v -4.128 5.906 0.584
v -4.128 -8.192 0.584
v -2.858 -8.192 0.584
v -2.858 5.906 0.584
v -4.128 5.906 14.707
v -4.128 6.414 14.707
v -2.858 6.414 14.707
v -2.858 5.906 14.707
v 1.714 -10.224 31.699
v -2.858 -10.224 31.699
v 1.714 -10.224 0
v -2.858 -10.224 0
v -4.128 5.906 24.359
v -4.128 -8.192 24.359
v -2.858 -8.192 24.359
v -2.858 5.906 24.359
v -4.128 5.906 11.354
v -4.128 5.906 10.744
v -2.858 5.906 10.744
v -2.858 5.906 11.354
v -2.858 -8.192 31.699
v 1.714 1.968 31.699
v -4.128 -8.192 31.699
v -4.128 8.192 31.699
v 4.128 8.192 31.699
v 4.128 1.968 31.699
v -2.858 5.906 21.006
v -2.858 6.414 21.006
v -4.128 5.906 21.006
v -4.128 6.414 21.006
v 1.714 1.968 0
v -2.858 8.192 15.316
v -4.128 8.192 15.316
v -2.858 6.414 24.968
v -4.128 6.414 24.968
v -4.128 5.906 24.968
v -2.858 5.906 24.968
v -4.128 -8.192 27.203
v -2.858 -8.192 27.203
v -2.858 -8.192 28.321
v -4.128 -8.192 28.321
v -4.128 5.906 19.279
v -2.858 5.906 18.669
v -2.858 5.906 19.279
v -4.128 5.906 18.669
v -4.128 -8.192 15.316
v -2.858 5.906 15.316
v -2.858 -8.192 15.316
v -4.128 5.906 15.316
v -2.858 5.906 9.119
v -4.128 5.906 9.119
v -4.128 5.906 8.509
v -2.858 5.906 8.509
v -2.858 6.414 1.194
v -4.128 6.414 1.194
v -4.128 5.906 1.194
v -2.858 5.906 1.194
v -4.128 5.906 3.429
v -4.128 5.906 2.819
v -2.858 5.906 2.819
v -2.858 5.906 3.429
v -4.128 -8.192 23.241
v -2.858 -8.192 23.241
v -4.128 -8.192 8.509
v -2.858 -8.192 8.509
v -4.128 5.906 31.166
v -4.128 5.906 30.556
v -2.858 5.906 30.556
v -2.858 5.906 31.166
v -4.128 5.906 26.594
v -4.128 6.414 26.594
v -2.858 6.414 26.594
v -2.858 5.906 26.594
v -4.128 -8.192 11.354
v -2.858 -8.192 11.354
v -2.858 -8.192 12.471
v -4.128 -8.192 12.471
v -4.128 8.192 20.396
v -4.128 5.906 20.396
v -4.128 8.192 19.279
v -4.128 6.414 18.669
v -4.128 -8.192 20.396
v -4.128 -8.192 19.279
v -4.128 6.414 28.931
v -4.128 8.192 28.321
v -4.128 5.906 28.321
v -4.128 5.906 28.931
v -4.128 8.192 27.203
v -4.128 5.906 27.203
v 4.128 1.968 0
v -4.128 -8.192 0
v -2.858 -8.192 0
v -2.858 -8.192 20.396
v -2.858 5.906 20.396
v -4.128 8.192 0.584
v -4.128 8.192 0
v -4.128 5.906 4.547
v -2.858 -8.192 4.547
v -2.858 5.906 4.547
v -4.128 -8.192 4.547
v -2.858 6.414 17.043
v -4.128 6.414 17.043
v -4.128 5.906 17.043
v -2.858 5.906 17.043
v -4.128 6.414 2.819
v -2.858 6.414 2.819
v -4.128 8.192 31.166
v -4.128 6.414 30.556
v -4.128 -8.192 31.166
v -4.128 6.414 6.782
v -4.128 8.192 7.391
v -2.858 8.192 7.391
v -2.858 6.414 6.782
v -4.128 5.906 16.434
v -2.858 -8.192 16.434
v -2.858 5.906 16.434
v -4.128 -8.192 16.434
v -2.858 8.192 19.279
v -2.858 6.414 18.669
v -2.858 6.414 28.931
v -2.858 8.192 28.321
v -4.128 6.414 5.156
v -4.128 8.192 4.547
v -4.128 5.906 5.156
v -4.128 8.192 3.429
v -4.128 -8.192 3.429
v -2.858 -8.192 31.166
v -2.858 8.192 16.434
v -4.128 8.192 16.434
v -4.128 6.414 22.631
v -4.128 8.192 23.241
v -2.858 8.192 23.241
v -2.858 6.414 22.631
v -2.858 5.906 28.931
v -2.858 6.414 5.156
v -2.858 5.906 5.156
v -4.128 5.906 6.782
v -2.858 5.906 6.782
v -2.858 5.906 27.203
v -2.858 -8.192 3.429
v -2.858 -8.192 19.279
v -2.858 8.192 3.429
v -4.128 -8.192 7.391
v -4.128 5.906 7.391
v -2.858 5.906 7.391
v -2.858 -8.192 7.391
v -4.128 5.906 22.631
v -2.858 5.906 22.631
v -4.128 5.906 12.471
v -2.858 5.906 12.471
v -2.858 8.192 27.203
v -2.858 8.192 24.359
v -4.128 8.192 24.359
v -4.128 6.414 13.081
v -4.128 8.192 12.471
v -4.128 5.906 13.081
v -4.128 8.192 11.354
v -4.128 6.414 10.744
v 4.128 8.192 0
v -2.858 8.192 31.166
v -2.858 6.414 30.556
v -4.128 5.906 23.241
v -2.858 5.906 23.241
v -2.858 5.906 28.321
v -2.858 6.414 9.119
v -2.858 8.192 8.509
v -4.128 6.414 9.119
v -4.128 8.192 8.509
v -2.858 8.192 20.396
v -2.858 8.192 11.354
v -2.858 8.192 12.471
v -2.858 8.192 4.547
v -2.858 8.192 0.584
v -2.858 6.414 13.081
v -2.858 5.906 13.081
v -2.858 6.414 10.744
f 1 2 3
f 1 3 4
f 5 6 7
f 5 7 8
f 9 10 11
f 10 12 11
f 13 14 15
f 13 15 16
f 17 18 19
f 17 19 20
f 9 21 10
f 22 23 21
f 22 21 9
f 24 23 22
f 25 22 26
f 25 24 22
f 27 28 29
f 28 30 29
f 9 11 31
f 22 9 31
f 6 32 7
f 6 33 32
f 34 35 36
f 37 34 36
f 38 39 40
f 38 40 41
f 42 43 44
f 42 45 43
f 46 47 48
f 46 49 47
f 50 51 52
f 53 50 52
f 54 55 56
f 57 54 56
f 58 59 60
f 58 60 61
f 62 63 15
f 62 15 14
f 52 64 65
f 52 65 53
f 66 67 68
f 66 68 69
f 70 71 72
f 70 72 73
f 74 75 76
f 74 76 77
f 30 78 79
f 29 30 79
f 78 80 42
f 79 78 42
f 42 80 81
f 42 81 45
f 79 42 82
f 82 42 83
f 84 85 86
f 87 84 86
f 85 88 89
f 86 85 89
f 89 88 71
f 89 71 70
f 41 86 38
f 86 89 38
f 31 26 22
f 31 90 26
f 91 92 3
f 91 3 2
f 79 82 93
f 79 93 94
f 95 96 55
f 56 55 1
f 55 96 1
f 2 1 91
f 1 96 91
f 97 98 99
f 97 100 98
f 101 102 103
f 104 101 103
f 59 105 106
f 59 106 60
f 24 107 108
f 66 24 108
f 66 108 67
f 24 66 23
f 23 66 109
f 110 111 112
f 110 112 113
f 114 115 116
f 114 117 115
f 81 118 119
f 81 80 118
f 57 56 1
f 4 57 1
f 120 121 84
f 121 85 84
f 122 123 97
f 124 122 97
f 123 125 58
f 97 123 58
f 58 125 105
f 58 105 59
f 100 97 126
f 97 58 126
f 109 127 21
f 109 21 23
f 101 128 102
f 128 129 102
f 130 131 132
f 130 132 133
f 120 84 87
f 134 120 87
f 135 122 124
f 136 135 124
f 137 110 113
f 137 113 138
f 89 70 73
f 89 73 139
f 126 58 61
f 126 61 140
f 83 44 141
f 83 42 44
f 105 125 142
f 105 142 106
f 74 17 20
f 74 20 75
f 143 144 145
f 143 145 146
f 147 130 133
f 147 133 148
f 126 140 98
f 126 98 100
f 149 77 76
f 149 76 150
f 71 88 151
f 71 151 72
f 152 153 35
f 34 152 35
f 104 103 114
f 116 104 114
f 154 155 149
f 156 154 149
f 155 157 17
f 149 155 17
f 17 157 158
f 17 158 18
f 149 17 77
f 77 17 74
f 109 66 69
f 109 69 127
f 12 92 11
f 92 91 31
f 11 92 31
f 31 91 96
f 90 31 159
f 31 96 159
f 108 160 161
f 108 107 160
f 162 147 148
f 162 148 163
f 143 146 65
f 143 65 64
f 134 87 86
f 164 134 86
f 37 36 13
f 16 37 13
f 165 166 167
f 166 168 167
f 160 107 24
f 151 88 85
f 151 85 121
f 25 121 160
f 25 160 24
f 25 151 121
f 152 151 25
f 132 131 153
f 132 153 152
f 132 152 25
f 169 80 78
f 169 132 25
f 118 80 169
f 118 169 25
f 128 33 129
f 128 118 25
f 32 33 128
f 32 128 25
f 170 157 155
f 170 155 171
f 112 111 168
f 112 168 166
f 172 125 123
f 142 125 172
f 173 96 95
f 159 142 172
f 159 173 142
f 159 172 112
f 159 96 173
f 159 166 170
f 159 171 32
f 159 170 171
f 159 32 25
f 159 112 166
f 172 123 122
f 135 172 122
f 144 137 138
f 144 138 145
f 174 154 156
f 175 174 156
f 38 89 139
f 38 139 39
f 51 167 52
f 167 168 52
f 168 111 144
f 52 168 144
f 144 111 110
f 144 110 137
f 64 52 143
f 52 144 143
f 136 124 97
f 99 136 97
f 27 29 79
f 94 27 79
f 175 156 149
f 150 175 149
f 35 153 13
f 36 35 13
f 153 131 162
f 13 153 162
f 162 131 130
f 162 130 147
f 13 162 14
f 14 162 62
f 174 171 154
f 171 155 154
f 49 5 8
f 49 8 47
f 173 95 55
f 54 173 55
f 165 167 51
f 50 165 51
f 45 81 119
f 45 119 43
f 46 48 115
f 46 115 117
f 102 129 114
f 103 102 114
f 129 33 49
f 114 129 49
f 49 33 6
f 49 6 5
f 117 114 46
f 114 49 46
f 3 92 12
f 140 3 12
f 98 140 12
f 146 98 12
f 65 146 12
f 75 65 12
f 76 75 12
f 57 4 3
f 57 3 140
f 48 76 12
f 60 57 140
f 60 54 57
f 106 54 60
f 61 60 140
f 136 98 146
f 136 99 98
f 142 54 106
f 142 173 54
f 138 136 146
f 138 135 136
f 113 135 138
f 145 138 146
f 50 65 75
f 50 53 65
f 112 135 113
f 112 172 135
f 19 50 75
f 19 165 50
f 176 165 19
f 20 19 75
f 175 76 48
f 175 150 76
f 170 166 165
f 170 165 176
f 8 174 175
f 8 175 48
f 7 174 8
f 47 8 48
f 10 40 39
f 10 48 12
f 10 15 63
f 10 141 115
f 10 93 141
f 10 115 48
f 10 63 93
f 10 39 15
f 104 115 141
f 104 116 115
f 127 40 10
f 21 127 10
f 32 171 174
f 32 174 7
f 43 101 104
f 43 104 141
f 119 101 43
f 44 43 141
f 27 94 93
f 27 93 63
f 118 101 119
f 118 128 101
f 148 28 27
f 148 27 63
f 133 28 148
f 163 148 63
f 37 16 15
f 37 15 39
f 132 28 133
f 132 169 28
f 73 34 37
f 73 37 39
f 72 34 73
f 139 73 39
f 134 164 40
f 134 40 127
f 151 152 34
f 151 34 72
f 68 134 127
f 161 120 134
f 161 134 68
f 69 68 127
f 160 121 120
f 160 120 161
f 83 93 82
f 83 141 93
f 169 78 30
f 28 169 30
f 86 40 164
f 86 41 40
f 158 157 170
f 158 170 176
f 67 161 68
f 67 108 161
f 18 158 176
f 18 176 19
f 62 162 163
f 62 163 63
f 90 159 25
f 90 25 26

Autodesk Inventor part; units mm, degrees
ref_plane "YZ Plane" through (0, 0, 0) normal (1, 0, 0) x (0, 1, 0)
ref_plane "XZ Plane" through (0, 0, 0) normal (0, 1, 0) x (-1, 0, 0)
ref_plane "XY Plane" through (0, 0, 0) normal (0, 0, 1) x (1, 0, 0)
sketch "Sketch1" plane through (0, 0, 0) normal (0, 0, 1) x (1, 0, 0)
  line L0 (-4.1275, 8.1915) -> (4.1275, 8.1915)
  line L1 (-4.1275, 8.1915) -> (-4.1275, -8.1915)
  line L2 (-2.8575, -10.2235) -> (1.7145, -10.2235)
  line L3 (-2.8575, -10.2235) -> (-2.8575, -8.1915)
  line L4 (-2.8575, -8.1915) -> (-4.1275, -8.1915)
  line L5 (4.1275, 8.1915) -> (4.1275, 1.9685)
  line L6 (1.7145, -10.2235) -> (1.7145, 1.9685)
  line L7 (4.1275, 1.9685) -> (1.7145, 1.9685)
  point P0 (0, 0)
  point P1 (0, 8.1915)
  point P2 (-4.1275, 0)
  dimension "d0" = 8.255
  dimension "d2" = 1.27
  dimension "d3" = 2.032
  dimension "d4" = 18.415
  dimension "d5" = 4.572
  dimension "d6" = 6.223
extrude "Extrusion1" add sketch "Sketch1" along normal blind 31.6992
sketch "Sketch2" plane through (-4.1275, -8.1915, 31.6992) normal (-1, 0, 0) x (0, 0, 1)
  line L0 (-31.6992, 16.383) -> (0, 16.383) projected
  line L1 (-31.6992, 0) -> (-31.6992, 16.383) projected
  line L2 (-31.6992, 0) -> (0, 0) projected
  line L3 (-31.115, 16.383) -> (-28.2702, 16.383)
  line L4 (-28.2702, 14.097) -> (-28.2702, 0)
  line L5 (-28.2702, 0) -> (-31.115, 0)
  line L6 (-31.115, 0) -> (-31.115, 14.097)
  line L7 (-30.5054, 14.605) -> (-30.5054, 14.097)
  line L8 (-31.115, 16.383) -> (-30.5054, 14.605)
  line L9 (-30.5054, 14.097) -> (-31.115, 14.097)
  line L10 (-28.8798, 14.605) -> (-28.8798, 14.097)
  line L11 (-28.2702, 16.383) -> (-28.8798, 14.605)
  line L12 (-28.8798, 14.097) -> (-28.2702, 14.097)
  line L13 (-27.1526, 16.383) -> (-24.3078, 16.383)
  line L14 (-24.3078, 14.097) -> (-24.3078, 0)
  line L15 (-24.3078, 0) -> (-27.1526, 0)
  line L16 (-27.1526, 0) -> (-27.1526, 14.097)
  line L17 (-26.543, 14.605) -> (-26.543, 14.097)
  line L18 (-27.1526, 16.383) -> (-26.543, 14.605)
  line L19 (-26.543, 14.097) -> (-27.1526, 14.097)
  line L20 (-24.3078, 16.383) -> (-24.9174, 14.605)
  line L21 (-24.9174, 14.605) -> (-24.9174, 14.097)
  line L22 (-24.9174, 14.097) -> (-24.3078, 14.097)
  line L23 (-23.1902, 16.383) -> (-20.3454, 16.383)
  line L24 (-20.3454, 14.097) -> (-20.3454, 0)
  line L25 (-20.3454, 0) -> (-23.1902, 0)
  line L26 (-23.1902, 0) -> (-23.1902, 14.097)
  line L27 (-22.5806, 14.605) -> (-22.5806, 14.097)
  line L28 (-23.1902, 16.383) -> (-22.5806, 14.605)
  line L29 (-22.5806, 14.097) -> (-23.1902, 14.097)
  line L30 (-20.3454, 16.383) -> (-20.955, 14.605)
  line L31 (-20.955, 14.605) -> (-20.955, 14.097)
  line L32 (-20.955, 14.097) -> (-20.3454, 14.097)
  line L33 (-19.2278, 16.383) -> (-16.383, 16.383)
  line L34 (-16.383, 14.097) -> (-16.383, 0)
  line L35 (-16.383, 0) -> (-19.2278, 0)
  line L36 (-19.2278, 0) -> (-19.2278, 14.097)
  line L37 (-18.6182, 14.605) -> (-18.6182, 14.097)
  line L38 (-19.2278, 16.383) -> (-18.6182, 14.605)
  line L39 (-18.6182, 14.097) -> (-19.2278, 14.097)
  line L40 (-16.383, 16.383) -> (-16.9926, 14.605)
  line L41 (-16.9926, 14.605) -> (-16.9926, 14.097)
  line L42 (-16.9926, 14.097) -> (-16.383, 14.097)
  line L43 (-15.2654, 16.383) -> (-12.4206, 16.383)
  line L44 (-12.4206, 14.097) -> (-12.4206, 0)
  line L45 (-12.4206, 0) -> (-15.2654, 0)
  line L46 (-15.2654, 0) -> (-15.2654, 14.097)
  line L47 (-14.6558, 14.605) -> (-14.6558, 14.097)
  line L48 (-15.2654, 16.383) -> (-14.6558, 14.605)
  line L49 (-14.6558, 14.097) -> (-15.2654, 14.097)
  line L50 (-12.4206, 16.383) -> (-13.0302, 14.605)
  line L51 (-13.0302, 14.605) -> (-13.0302, 14.097)
  line L52 (-13.0302, 14.097) -> (-12.4206, 14.097)
  line L53 (-11.303, 16.383) -> (-8.4582, 16.383)
  line L54 (-8.4582, 14.097) -> (-8.4582, 0)
  line L55 (-8.4582, 0) -> (-11.303, 0)
  line L56 (-11.303, 0) -> (-11.303, 14.097)
  line L57 (-10.6934, 14.605) -> (-10.6934, 14.097)
  line L58 (-11.303, 16.383) -> (-10.6934, 14.605)
  line L59 (-10.6934, 14.097) -> (-11.303, 14.097)
  line L60 (-8.4582, 16.383) -> (-9.0678, 14.605)
  line L61 (-9.0678, 14.605) -> (-9.0678, 14.097)
  line L62 (-9.0678, 14.097) -> (-8.4582, 14.097)
  line L63 (-7.3406, 16.383) -> (-4.4958, 16.383)
  line L64 (-4.4958, 14.097) -> (-4.4958, 0)
  line L65 (-4.4958, 0) -> (-7.3406, 0)
  line L66 (-7.3406, 0) -> (-7.3406, 14.097)
  line L67 (-6.731, 14.605) -> (-6.731, 14.097)
  line L68 (-7.3406, 16.383) -> (-6.731, 14.605)
  line L69 (-6.731, 14.097) -> (-7.3406, 14.097)
  line L70 (-4.4958, 16.383) -> (-5.1054, 14.605)
  line L71 (-5.1054, 14.605) -> (-5.1054, 14.097)
  line L72 (-5.1054, 14.097) -> (-4.4958, 14.097)
  line L73 (-3.3782, 16.383) -> (-0.5334, 16.383)
  line L74 (-0.5334, 14.097) -> (-0.5334, 0)
  line L75 (-0.5334, 0) -> (-3.3782, 0)
  line L76 (-3.3782, 0) -> (-3.3782, 14.097)
  line L77 (-2.7686, 14.605) -> (-2.7686, 14.097)
  line L78 (-3.3782, 16.383) -> (-2.7686, 14.605)
  line L79 (-2.7686, 14.097) -> (-3.3782, 14.097)
  line L80 (-0.5334, 16.383) -> (-1.143, 14.605)
  line L81 (-1.143, 14.605) -> (-1.143, 14.097)
  line L82 (-1.143, 14.097) -> (-0.5334, 14.097)
  dimension "d9" = 0.5842
  dimension "d10" = 2.8448
  dimension "d11" = 0.6096
  dimension "d12" = 0.508
  dimension "d13" = 2.286
  dimension "d14" = 2.286
  dimension "d15" = 0.508
  dimension "d18" = 3.9624
extrude "Extrusion2" cut sketch "Sketch2" against normal blind 1.27 contours L0 L11 L10 L12 L4 L2 L6 L9 L7 L8 | L0 L20 L21 L22 L14 L2 L16 L19 L17 L18 | L0 L30 L31 L32 L24 L2 L26 L29 L27 L28 | L0 L40 L41 L42 L34 L2 L36 L39 L37 L38 | L0 L50 L51 L52 L44 L2 L46 L49 L47 L48 | L0 L60 L61 L62 L54 L2 L56 L59 L57 L58 | L0 L70 L71 L72 L64 L2 L66 L69 L67 L68 | L0 L80 L81 L82 L74 L2 L76 L79 L77 L78
properties part number "Connector, IDC, 8 Pin, SR"
